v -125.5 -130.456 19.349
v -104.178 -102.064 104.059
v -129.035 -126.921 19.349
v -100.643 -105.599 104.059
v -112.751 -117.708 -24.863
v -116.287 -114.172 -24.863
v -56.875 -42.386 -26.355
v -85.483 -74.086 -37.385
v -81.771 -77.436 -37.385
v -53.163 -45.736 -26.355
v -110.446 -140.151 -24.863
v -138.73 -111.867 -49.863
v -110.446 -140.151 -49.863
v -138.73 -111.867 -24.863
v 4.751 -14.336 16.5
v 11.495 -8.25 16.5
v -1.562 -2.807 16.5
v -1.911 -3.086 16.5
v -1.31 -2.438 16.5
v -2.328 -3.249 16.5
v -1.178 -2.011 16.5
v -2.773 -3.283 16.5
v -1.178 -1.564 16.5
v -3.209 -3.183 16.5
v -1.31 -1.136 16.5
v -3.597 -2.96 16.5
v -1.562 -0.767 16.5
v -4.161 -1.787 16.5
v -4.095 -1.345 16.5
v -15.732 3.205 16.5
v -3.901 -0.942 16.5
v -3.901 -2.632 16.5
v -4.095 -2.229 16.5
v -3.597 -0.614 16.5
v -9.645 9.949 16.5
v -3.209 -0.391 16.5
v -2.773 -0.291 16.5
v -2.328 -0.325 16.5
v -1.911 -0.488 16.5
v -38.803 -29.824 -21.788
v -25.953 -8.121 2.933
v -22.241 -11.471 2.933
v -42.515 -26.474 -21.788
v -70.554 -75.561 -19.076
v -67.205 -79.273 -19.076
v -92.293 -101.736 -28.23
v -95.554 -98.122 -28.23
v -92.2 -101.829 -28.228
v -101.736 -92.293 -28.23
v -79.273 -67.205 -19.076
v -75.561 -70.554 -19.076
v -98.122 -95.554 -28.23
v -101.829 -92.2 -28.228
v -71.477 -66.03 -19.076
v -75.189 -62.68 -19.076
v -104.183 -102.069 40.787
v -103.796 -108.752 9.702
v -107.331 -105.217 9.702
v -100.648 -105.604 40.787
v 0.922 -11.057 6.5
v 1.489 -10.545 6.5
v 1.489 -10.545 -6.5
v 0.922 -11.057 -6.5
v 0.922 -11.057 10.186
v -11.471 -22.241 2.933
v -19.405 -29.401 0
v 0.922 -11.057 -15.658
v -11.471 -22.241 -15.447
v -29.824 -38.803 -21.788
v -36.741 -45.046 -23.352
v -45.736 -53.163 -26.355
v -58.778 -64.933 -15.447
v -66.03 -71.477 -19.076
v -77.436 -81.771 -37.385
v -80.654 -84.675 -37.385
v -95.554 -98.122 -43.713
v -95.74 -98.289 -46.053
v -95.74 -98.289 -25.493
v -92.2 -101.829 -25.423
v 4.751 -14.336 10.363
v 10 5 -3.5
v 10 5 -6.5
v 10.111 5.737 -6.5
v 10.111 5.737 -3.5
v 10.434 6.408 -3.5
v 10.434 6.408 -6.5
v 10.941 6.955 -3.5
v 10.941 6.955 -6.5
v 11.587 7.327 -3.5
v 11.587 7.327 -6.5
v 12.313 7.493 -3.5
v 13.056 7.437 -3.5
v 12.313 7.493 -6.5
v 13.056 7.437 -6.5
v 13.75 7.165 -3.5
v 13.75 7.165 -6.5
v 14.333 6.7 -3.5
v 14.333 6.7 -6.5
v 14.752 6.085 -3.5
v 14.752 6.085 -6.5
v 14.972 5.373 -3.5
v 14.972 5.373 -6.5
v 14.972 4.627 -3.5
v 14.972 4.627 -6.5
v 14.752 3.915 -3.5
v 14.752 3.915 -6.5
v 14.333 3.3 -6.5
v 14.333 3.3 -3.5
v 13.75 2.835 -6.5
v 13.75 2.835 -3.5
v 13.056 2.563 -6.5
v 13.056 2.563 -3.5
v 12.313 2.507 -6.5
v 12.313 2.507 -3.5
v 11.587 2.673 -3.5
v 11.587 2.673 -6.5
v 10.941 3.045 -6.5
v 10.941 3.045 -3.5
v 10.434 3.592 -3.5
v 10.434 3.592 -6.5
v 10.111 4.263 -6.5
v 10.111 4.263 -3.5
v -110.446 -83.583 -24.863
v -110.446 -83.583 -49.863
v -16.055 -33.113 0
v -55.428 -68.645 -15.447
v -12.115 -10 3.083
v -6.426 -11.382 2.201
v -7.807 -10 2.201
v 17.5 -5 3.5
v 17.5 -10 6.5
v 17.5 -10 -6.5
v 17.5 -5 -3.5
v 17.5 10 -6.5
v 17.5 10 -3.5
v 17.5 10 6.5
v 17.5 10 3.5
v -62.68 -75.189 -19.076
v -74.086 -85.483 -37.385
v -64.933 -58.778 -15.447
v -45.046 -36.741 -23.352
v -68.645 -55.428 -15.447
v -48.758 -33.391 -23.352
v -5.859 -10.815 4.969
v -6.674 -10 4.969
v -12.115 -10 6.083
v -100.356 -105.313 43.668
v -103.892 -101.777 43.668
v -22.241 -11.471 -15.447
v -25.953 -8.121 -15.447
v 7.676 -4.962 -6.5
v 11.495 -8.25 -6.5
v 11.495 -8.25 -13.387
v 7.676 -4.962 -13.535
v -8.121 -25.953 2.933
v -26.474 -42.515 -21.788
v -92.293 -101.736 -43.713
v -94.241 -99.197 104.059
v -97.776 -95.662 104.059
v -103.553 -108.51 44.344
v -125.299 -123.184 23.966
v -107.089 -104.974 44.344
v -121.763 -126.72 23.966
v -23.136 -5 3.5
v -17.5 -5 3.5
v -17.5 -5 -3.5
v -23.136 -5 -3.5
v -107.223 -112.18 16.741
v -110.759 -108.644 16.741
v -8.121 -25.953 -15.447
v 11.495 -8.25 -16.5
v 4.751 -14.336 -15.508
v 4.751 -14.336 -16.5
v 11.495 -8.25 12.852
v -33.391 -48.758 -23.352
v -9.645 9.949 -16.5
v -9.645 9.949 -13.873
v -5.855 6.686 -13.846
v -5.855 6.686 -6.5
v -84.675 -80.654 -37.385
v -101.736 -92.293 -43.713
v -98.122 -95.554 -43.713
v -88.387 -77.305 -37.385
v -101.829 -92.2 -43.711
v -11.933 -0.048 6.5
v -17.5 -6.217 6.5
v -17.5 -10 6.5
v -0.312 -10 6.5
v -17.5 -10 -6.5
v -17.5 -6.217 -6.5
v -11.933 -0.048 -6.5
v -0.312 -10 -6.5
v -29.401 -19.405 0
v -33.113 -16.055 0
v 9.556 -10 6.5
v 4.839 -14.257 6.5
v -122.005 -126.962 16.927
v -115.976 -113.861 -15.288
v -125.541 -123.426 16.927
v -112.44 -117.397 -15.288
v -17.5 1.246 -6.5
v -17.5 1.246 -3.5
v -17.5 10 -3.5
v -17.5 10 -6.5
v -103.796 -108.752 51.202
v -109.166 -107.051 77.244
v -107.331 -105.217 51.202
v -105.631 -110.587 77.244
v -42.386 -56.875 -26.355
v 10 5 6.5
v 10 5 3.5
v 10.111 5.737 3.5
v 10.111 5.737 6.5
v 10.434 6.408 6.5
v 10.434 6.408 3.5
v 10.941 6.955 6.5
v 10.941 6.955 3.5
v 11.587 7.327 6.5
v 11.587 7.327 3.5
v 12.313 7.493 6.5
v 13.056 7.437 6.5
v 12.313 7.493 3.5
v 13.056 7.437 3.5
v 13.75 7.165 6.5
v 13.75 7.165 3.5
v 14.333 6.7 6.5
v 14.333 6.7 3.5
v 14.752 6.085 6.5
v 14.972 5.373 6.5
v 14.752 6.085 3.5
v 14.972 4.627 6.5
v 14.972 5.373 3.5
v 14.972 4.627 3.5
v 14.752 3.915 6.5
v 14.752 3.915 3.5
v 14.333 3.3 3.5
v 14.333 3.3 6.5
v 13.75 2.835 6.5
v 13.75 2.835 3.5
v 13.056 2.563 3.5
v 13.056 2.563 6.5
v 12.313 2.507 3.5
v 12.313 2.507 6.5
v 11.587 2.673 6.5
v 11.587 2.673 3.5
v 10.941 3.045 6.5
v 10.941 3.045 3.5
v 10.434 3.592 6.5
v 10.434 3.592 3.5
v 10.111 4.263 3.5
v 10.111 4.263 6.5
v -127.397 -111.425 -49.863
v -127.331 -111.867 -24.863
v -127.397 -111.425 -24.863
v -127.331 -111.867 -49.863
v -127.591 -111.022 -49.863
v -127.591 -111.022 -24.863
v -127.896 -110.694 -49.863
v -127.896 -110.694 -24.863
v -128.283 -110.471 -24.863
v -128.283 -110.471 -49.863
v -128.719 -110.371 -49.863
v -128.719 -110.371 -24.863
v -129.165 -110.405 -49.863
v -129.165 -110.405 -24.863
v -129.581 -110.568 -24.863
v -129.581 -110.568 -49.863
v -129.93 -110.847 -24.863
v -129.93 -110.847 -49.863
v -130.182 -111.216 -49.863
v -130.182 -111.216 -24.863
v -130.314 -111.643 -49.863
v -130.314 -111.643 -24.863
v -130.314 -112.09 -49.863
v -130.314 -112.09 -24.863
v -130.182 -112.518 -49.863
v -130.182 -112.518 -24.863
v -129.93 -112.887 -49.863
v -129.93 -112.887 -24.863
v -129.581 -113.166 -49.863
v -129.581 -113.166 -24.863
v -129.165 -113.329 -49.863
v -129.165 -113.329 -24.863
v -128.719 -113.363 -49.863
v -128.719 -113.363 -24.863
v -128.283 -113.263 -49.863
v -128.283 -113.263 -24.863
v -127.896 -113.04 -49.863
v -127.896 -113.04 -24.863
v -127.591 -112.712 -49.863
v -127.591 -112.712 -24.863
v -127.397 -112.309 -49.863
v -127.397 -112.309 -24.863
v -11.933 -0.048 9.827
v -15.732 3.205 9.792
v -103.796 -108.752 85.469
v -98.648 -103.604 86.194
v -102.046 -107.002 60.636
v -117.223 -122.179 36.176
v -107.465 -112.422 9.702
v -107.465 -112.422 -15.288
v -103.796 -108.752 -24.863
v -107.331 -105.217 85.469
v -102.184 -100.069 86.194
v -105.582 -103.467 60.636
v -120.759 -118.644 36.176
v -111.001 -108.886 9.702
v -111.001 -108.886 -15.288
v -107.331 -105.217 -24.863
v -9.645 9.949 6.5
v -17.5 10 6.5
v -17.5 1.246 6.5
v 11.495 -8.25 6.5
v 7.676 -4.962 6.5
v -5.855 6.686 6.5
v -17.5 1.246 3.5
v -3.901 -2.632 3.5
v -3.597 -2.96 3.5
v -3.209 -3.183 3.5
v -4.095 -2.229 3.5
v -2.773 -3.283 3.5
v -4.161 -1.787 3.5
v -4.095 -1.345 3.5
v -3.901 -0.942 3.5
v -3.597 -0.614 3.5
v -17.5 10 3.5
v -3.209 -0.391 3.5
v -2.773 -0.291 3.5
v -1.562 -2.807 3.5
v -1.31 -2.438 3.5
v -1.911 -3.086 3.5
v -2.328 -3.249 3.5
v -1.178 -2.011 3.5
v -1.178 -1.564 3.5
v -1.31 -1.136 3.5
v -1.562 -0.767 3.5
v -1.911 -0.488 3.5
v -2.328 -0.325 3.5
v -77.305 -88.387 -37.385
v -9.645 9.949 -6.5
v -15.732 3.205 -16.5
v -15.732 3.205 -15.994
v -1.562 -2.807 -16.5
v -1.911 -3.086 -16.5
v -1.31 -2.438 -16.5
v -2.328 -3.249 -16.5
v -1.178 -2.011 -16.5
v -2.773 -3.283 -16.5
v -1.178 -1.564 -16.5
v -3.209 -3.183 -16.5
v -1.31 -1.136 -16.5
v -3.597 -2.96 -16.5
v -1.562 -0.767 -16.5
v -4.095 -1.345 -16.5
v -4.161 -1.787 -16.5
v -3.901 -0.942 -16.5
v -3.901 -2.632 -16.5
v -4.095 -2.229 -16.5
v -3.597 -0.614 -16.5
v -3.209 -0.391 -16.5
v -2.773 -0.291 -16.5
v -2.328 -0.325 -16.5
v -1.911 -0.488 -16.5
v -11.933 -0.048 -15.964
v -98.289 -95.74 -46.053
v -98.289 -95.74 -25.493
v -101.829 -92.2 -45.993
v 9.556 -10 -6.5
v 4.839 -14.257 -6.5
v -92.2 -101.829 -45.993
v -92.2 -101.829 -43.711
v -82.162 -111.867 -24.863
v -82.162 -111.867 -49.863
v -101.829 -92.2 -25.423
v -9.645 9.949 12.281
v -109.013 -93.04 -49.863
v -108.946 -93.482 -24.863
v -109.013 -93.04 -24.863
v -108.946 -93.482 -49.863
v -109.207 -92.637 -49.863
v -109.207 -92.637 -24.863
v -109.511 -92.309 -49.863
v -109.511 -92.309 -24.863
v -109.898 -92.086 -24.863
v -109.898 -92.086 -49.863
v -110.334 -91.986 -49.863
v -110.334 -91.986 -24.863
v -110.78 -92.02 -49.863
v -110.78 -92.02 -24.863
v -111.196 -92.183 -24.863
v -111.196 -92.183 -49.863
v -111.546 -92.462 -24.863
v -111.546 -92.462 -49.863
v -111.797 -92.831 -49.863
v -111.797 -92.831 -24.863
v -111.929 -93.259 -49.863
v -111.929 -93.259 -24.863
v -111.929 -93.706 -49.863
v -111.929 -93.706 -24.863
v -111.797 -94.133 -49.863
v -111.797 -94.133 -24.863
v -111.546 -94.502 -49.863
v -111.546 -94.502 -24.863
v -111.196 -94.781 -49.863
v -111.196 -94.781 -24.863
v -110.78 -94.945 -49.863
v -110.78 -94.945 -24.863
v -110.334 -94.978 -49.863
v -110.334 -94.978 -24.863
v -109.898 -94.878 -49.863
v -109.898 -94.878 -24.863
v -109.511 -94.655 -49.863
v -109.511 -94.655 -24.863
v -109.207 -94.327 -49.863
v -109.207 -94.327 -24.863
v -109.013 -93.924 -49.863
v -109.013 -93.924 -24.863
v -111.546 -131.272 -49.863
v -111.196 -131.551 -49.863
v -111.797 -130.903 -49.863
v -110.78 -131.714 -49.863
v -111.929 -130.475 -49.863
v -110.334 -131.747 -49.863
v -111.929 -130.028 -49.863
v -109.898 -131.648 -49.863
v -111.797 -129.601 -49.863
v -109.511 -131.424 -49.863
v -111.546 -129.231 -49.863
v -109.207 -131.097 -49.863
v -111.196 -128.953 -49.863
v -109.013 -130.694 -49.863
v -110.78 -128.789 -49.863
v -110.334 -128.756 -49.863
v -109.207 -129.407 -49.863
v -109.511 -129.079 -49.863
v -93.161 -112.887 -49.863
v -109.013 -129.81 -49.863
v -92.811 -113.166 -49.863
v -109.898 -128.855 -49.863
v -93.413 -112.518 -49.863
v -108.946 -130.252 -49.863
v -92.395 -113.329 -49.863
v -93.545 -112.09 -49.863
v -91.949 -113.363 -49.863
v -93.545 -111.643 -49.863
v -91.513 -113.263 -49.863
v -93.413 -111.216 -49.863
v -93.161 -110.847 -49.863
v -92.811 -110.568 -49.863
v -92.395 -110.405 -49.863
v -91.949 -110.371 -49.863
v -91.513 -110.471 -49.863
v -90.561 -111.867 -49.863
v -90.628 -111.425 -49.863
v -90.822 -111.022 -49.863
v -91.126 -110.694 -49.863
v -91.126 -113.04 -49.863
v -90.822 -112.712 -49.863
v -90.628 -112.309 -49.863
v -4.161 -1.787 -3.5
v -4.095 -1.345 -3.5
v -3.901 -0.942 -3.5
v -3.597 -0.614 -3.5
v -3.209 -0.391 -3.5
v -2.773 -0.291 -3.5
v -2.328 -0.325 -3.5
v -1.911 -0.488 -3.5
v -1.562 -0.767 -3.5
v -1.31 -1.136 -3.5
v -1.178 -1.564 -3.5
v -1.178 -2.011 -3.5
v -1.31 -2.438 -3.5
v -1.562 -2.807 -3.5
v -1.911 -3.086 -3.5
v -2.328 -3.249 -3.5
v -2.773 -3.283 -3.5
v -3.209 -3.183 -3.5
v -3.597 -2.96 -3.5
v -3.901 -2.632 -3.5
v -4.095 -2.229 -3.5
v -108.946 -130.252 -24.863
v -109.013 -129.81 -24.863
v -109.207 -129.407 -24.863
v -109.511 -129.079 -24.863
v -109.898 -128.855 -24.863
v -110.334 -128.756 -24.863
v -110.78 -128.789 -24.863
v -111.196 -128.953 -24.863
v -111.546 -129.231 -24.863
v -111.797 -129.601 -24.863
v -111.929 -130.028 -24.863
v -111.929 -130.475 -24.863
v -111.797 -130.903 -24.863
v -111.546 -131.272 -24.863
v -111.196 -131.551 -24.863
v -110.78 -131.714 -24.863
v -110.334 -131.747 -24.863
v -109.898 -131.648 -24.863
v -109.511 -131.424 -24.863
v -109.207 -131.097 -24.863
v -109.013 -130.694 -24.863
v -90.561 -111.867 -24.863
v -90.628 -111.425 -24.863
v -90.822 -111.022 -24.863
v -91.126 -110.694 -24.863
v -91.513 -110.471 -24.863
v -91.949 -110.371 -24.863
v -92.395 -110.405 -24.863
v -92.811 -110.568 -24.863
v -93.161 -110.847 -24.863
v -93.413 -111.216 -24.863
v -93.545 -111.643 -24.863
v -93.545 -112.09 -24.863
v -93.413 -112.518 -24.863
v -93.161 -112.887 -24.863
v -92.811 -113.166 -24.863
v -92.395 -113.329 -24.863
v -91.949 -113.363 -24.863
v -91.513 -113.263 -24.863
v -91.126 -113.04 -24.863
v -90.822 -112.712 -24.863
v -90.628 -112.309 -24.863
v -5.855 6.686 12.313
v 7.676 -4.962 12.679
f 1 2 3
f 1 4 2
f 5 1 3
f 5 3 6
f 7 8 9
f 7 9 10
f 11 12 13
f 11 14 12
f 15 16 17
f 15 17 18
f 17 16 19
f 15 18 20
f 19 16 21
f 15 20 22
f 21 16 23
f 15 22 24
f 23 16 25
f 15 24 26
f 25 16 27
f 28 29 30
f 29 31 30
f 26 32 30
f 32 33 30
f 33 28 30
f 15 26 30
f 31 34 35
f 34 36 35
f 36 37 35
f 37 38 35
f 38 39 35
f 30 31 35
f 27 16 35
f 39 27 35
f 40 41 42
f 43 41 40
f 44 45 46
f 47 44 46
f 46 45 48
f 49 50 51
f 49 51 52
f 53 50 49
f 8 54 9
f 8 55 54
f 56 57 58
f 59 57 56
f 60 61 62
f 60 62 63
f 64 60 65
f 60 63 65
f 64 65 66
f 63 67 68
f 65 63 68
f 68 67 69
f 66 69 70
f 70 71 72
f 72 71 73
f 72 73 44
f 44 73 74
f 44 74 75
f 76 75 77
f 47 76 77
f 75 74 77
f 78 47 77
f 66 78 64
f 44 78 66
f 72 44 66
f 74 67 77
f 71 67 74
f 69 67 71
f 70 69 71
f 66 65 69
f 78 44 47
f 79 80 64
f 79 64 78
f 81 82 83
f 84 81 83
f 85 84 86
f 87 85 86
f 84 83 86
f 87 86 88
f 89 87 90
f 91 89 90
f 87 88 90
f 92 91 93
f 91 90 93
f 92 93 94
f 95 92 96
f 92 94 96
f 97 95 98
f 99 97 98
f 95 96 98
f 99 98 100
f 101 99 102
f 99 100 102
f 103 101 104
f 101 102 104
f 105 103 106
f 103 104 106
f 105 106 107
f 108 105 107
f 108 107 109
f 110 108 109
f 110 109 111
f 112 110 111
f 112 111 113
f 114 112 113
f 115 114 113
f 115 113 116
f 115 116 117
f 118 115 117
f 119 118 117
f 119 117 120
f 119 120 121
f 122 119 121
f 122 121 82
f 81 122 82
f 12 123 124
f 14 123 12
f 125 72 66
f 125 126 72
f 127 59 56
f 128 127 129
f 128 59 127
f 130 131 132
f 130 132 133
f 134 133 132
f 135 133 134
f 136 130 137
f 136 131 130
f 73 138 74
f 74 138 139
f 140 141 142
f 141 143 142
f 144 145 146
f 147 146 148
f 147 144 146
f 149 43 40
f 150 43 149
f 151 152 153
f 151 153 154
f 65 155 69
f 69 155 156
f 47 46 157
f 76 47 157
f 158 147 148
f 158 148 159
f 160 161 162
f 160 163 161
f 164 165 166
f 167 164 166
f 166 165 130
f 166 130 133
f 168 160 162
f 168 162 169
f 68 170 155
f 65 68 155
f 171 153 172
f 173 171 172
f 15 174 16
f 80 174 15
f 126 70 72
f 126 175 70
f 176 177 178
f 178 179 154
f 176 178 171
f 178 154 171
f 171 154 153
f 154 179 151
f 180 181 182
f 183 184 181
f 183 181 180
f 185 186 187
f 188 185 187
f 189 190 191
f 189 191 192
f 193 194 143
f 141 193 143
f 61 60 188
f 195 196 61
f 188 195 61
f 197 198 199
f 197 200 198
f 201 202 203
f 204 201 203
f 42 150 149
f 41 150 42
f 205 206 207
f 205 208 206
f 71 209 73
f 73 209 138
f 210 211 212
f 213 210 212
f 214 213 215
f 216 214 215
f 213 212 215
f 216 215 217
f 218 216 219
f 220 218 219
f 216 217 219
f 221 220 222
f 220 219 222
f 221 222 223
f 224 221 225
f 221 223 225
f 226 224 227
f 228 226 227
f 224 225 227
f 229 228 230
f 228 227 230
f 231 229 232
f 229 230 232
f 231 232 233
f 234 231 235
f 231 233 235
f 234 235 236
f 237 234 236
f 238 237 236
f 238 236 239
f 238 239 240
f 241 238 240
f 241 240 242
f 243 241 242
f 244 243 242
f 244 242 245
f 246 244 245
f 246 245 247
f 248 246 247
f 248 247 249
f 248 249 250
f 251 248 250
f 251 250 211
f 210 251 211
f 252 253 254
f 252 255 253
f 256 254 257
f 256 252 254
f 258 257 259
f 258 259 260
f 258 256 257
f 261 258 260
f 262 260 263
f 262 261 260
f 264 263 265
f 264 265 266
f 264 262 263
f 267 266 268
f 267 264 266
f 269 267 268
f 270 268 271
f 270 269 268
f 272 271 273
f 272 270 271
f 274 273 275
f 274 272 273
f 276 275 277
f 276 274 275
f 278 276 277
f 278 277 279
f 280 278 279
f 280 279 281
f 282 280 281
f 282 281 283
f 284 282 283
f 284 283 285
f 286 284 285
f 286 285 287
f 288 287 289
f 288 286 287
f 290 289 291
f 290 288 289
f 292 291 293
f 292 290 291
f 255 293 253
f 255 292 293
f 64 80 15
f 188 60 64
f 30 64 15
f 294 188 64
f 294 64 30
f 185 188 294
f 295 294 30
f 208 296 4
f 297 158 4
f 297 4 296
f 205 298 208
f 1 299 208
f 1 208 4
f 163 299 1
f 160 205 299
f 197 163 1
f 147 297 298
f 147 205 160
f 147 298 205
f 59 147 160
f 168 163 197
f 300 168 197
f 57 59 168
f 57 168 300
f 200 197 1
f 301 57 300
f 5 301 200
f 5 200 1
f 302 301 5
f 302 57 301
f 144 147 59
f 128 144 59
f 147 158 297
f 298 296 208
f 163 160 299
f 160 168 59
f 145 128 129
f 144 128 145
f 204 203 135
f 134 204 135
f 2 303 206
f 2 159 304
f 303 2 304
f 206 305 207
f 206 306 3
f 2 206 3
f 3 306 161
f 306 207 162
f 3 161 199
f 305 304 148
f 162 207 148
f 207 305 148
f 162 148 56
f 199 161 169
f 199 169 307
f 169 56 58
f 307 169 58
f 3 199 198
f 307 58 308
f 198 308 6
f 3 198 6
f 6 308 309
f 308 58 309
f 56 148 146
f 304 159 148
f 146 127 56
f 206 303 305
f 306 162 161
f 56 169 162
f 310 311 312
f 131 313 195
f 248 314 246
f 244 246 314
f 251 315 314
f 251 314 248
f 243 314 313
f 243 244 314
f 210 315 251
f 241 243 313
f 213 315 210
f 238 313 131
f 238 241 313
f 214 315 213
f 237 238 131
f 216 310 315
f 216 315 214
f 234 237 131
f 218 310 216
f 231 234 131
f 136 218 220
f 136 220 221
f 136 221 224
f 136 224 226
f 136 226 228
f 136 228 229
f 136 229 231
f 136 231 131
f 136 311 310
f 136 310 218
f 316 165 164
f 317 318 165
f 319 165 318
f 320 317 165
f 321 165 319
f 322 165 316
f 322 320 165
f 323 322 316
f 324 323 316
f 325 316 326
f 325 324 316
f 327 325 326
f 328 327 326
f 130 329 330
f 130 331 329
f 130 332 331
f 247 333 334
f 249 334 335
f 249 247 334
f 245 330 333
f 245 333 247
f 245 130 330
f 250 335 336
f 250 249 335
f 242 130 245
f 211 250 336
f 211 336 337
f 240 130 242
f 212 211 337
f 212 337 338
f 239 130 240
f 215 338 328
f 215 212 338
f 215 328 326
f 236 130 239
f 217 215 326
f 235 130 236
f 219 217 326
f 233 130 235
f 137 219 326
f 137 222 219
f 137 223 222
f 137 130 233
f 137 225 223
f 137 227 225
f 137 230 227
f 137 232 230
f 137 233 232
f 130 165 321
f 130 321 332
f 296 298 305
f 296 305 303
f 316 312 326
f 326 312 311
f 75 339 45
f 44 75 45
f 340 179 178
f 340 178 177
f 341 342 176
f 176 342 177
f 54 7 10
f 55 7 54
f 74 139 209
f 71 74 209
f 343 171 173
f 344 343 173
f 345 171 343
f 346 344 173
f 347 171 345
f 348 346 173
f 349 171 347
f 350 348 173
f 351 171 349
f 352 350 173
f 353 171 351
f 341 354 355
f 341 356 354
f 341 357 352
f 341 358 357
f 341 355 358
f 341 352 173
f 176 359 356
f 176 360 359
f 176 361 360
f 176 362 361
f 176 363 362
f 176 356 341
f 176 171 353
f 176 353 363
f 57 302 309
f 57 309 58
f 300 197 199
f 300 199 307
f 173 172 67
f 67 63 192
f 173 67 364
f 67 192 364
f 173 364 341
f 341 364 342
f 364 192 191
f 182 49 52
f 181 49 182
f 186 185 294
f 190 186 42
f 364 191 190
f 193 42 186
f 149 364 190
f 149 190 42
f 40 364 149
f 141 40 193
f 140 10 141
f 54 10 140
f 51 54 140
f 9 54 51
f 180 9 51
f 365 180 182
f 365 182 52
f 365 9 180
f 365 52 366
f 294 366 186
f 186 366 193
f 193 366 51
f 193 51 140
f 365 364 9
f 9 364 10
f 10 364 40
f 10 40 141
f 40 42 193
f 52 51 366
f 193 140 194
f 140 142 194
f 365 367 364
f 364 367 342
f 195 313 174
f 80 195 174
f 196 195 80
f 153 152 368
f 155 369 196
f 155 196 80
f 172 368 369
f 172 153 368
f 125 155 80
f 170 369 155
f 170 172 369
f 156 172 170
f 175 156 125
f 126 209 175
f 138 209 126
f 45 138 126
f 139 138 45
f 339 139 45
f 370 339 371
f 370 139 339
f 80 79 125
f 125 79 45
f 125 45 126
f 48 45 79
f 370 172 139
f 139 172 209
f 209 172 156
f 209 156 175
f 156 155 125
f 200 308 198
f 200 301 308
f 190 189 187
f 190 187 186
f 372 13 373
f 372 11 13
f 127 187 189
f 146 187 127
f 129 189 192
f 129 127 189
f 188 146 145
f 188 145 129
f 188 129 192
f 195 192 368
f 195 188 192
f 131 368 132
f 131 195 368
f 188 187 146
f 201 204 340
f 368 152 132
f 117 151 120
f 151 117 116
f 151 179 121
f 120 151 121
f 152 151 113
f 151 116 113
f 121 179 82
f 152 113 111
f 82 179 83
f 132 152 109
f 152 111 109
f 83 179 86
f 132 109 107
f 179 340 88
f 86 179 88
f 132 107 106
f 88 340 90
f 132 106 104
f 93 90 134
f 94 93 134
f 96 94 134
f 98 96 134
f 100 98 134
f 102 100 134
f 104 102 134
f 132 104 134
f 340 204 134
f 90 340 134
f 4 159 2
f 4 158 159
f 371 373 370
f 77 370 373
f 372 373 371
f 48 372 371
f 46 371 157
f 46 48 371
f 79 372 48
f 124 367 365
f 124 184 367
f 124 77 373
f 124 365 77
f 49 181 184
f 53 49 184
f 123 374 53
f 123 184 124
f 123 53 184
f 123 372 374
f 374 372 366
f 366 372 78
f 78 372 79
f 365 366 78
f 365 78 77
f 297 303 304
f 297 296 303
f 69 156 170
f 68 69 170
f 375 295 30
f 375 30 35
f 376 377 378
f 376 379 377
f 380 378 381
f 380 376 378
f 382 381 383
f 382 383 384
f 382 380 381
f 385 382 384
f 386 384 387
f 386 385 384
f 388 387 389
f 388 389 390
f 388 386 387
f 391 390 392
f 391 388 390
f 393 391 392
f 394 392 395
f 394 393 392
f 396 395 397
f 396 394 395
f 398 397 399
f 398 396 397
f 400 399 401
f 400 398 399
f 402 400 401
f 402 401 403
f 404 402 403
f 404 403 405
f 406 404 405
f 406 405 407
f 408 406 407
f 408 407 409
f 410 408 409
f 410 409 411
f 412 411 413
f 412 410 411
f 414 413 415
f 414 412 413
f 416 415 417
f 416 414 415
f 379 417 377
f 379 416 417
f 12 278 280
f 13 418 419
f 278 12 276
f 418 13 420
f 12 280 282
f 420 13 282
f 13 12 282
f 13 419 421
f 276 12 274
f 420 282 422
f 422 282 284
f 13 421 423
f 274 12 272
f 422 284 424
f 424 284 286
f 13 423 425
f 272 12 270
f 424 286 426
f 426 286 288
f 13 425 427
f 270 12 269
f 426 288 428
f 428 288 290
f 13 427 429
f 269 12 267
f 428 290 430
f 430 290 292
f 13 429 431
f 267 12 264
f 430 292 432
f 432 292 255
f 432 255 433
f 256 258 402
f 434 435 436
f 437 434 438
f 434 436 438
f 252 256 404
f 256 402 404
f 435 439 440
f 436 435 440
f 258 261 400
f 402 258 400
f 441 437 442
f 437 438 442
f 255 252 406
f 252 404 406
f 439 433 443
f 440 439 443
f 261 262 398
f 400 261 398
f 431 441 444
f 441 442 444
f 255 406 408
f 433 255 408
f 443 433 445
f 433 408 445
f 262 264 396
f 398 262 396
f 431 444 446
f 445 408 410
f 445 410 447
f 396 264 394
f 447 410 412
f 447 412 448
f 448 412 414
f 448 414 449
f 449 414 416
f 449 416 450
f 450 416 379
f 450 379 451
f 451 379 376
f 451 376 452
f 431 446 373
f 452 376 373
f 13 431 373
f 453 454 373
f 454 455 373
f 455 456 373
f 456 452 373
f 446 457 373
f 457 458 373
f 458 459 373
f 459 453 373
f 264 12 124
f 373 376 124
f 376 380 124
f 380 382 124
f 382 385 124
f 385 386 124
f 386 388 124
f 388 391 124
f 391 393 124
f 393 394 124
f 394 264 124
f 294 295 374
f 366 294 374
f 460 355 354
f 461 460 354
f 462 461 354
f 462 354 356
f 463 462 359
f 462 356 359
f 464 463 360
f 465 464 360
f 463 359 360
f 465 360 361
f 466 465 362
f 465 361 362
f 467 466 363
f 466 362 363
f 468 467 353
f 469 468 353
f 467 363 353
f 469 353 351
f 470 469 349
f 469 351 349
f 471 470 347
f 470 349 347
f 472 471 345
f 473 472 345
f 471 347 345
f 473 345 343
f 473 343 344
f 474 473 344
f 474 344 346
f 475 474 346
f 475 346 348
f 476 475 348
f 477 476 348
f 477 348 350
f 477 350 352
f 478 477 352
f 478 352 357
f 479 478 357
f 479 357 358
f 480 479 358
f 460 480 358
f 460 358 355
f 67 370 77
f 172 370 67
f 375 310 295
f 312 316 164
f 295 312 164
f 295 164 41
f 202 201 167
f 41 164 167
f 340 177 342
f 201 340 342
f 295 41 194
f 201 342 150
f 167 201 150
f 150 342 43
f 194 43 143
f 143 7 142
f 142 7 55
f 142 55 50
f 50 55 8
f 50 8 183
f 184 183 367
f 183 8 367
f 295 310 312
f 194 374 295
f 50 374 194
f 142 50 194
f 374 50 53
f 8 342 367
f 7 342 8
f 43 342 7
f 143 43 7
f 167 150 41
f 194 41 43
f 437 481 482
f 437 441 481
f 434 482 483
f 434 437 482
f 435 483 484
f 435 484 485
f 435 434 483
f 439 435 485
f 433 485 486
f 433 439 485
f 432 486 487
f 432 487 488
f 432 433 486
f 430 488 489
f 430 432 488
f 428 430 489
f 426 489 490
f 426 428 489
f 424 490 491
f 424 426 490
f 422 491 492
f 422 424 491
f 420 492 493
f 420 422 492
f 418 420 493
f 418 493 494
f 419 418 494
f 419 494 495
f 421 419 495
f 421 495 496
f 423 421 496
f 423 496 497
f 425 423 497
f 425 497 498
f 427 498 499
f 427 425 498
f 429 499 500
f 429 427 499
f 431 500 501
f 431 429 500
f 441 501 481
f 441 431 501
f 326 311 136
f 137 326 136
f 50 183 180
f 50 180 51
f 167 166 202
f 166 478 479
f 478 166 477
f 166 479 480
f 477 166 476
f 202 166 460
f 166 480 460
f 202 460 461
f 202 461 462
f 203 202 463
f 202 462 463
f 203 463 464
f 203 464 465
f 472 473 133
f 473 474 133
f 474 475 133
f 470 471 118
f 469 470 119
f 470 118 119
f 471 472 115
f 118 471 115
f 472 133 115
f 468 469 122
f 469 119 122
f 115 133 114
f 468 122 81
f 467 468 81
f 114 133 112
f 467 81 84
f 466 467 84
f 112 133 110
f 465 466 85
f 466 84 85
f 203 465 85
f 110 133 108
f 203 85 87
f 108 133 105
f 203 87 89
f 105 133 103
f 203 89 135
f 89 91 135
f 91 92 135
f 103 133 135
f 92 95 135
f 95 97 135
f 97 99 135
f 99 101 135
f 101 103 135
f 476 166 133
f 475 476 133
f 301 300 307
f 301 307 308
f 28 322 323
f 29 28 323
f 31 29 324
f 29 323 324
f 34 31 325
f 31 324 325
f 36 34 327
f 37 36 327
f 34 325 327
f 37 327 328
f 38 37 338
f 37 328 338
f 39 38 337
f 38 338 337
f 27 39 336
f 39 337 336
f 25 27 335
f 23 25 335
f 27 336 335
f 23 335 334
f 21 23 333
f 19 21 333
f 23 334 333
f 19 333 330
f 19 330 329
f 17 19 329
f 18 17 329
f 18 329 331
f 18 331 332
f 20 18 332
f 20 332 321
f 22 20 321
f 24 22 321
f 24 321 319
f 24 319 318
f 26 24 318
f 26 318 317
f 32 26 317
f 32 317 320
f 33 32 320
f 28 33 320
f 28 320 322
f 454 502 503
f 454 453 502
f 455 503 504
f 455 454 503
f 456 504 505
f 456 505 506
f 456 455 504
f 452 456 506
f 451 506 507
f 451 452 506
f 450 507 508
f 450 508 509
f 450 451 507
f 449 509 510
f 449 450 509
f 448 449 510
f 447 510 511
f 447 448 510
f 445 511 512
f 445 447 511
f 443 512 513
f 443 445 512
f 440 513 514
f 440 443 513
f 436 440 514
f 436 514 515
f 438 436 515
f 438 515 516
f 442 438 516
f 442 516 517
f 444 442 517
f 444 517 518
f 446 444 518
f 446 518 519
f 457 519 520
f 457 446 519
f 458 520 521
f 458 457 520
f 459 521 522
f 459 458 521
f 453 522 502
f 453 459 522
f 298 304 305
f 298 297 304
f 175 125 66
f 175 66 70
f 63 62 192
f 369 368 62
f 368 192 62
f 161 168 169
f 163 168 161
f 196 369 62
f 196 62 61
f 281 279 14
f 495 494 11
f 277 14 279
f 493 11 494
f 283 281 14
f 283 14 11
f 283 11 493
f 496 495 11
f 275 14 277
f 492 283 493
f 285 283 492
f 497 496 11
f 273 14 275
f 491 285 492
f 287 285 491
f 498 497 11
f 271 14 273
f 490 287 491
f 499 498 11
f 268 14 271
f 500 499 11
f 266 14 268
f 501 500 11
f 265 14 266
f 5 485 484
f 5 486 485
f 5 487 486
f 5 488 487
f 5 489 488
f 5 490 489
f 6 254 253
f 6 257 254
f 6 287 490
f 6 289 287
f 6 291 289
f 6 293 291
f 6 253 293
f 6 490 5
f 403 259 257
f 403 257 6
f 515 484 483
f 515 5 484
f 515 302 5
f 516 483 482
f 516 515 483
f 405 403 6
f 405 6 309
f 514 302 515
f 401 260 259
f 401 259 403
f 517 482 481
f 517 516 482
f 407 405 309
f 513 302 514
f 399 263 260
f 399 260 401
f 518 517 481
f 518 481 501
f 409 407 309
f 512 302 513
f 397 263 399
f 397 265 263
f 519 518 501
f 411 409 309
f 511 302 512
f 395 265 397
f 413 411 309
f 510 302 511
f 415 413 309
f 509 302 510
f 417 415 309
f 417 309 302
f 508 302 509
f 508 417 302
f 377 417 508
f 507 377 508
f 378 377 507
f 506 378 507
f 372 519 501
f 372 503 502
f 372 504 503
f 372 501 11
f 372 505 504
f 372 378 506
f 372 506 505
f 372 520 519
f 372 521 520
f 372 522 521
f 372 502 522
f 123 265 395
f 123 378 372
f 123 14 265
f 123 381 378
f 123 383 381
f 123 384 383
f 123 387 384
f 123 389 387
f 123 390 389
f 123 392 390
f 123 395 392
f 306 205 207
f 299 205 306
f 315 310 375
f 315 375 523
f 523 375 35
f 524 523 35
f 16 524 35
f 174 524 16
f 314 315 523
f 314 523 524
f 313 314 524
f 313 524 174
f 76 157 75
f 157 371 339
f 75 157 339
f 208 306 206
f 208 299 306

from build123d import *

# Parameters (mm, degrees)
SKETCH10_W               = 35
SKETCH10_H               = 20
BOSS_EXTRUDE9_DEPTH      = 6.5
SKETCH11_W               = 7
SKETCH11_H               = 15
CUT_EXTRUDE4_DEPTH       = 1
CUT_EXTRUDE4_DEPTH_BACK  = 36
BOSS_EXTRUDE10_DEPTH     = 2.5
CUT_EXTRUDE5_DEPTH       = 20
CUT_EXTRUDE6_DEPTH       = 20
BOSS_EXTRUDE11_DEPTH     = 10
SKETCH23_R               = 1.5
CUT_EXTRUDE7_DEPTH       = 34
SKETCH25_R               = 1.5
BOSS_EXTRUDE12_DEPTH     = 12.5
SKETCH27_W               = 7
SKETCH27_H               = 15
CUT_EXTRUDE9_DEPTH       = 20
SKETCH28_W               = 7
SKETCH28_H               = 6.245605743
CUT_EXTRUDE10_DEPTH      = 20
BOSS_EXTRUDE13_DEPTH     = 2.5
BOSS_EXTRUDE14_DEPTH     = 5
SKETCH31_R               = 2.5
CUT_EXTRUDE11_DEPTH      = 44.363432005
CUT_EXTRUDE11_DEPTH_BACK = 111.559122284


with BuildPart() as part:
    # Sketch10 → Boss-Extrude9 (new body, symmetric)
    with BuildSketch(Plane.XY):
        Rectangle(SKETCH10_W, SKETCH10_H)
    extrude(amount=BOSS_EXTRUDE9_DEPTH, both=True)

    # Sketch11 → Cut-Extrude4 (cut, two sides)
    with BuildSketch(Plane.ZY.offset(17.5)) as cut_extrude4_sk:
        with Locations((0, 2.5)):
            Rectangle(SKETCH11_W, SKETCH11_H)
    extrude(amount=CUT_EXTRUDE4_DEPTH, mode=Mode.SUBTRACT)
    extrude(cut_extrude4_sk.sketch, amount=-CUT_EXTRUDE4_DEPTH_BACK, mode=Mode.SUBTRACT)

    # Sketch19 → Boss-Extrude10 (add, symmetric)
    with BuildSketch(Plane(origin=(7.588283472, -8.408592155, 0), x_dir=(-0.742391283, -0.669966553, 0), z_dir=(0.669966553, -0.742391283, 0))):
        Polygon((-6.806611372, 12.5), (-6.806611372, 6.5), (5.959262629, 6.5), (5.959262629, -6.5), (-9.021371158, -6.5), (-9.021371158, -14.5), (143.193388628, 27.210594591), (143.193388628, 47.516269419), align=None)
        Polygon((23.416933748, 15.447357766), (23.416933748, -2.932626146), (48.137832442, 21.788272547), align=None, mode=Mode.SUBTRACT)
        Polygon((34.103204957, 0), (57.455439154, 23.352234198), (87.138773177, 15.447357766), align=None, mode=Mode.SUBTRACT)
        Polygon((69.571415231, 26.355349278), (96.907086696, 19.075671565), (112.271299908, 37.384757918), align=None, mode=Mode.SUBTRACT)
        Polygon((116.606735087, 37.384757918), (103.00206527, 19.075671565), (136.676990559, 28.230214742), (136.676990559, 43.712984767), align=None, mode=Mode.SUBTRACT)
    boss_extrude10 = extrude(amount=BOSS_EXTRUDE10_DEPTH, both=True)

    # Mirror3: Boss-Extrude10 across plane
    add(boss_extrude10.mirror(Plane(origin=(0, 0, 0), x_dir=(0, 0, 1), z_dir=(-0.707106781, 0.707106781, 0))))

    # Sketch20 → Cut-Extrude5 (cut)
    with BuildSketch(Plane(origin=(0, 0, -6.5), x_dir=(-1, 0, 0), z_dir=(0, 0, -1))):
        Polygon((-13.528185403, -10), (16.011199993, 15.429392684), (-17.5, 15.429392684), (-17.5, -10), align=None)
    extrude(amount=CUT_EXTRUDE5_DEPTH, mode=Mode.SUBTRACT)

    # Sketch21 → Cut-Extrude6 (cut)
    with BuildSketch(Plane.XY.offset(6.5)):
        Polygon((-16.011199993, 15.429392684), (13.528185403, -10), (17.5, -10), (17.5, 17.942203717), align=None)
    extrude(amount=CUT_EXTRUDE6_DEPTH, mode=Mode.SUBTRACT)

    # Sketch22 → Boss-Extrude11 (add)
    with BuildSketch(Plane(origin=(0, 0, -6.5), x_dir=(-1, 0, 0), z_dir=(0, 0, -1))):
        Polygon((-4.751258092, -14.336345099), (15.731654079, 3.20511341), (9.645399477, 9.949304357), (-11.495449039, -8.250090497), align=None)
    boss_extrude11 = extrude(amount=BOSS_EXTRUDE11_DEPTH)

    # Mirror5: Boss-Extrude11 across plane
    add(boss_extrude11.mirror(Plane.XY))

    # Sketch23 → Cut-Extrude7 (cut, through all)
    with BuildSketch(Plane(origin=(0, 0, -16.5), x_dir=(-1, 0, 0), z_dir=(0, 0, -1))):
        with Locations((2.661358897, -1.787066196)):
            Circle(SKETCH23_R)
    extrude(amount=-CUT_EXTRUDE7_DEPTH, mode=Mode.SUBTRACT)

    # Sketch25 → Boss-Extrude12 (add, symmetric)
    with BuildSketch(Plane.XY.offset(-37.363432005)):
        Polygon((-110.446046435, -140.151182494), (-82.161775188, -111.866911247), (-110.446046435, -83.582639999), (-138.730317683, -111.866911247), align=None)
        with Locations((-110.446046435, -93.482134936)):
            Circle(SKETCH25_R, mode=Mode.SUBTRACT)
        with Locations((-92.061270124, -111.866911247)):
            Circle(SKETCH25_R, mode=Mode.SUBTRACT)
        with Locations((-110.446046435, -130.251687558)):
            Circle(SKETCH25_R, mode=Mode.SUBTRACT)
        with Locations((-128.830822746, -111.866911247)):
            Circle(SKETCH25_R, mode=Mode.SUBTRACT)
    extrude(amount=BOSS_EXTRUDE12_DEPTH, both=True)

    # Sketch27 → Cut-Extrude9 (cut)
    with BuildSketch(Plane.ZY.offset(17.5)):
        with Locations((0, 2.5)):
            Rectangle(SKETCH27_W, SKETCH27_H)
    extrude(amount=-CUT_EXTRUDE9_DEPTH, mode=Mode.SUBTRACT)

    # Sketch28 → Cut-Extrude10 (cut)
    with BuildSketch(Plane(origin=(-17.5, 0, 0), x_dir=(0, 0, -1), z_dir=(1, 0, 0))):
        with Locations((0, -1.877197128)):
            Rectangle(SKETCH28_W, SKETCH28_H)
    extrude(amount=-CUT_EXTRUDE10_DEPTH, mode=Mode.SUBTRACT)

    # Sketch29 → Boss-Extrude13 (add, symmetric)
    with BuildSketch(Plane(origin=(0.710432406, -0.710432406, 0), x_dir=(0, 0, -1), z_dir=(0.707106781, -0.707106781, 0))):
        Polygon((-19.348604545, -180.98841896), (25.940877716, -162.519522981), (25.940877716, -150.294032198), (-9.701797277, -150.294032198), (-104.059122284, -136.781099823), (-104.059122284, -145.835191948), align=None)
        Polygon((-86.194464325, -143.014000871), (-85.469075751, -150.294032198), (-60.635525341, -147.819595909), align=None, mode=Mode.SUBTRACT)
        Polygon((-77.244001552, -152.888925889), (-36.176017731, -169.28301403), (-51.201535414, -150.294032198), align=None, mode=Mode.SUBTRACT)
        Polygon((15.288083197, -155.48381958), (-9.701797277, -155.48381958), (-16.926790753, -176.046505079), (15.288083197, -162.519522981), align=None, mode=Mode.SUBTRACT)
        Polygon((-23.96640174, -175.703793654), (-44.343704752, -149.951320773), (-16.741408265, -155.141108155), align=None, mode=Mode.SUBTRACT)
        Polygon((25.940877716, -162.519522981), (25.940877716, -150.294032198), (-9.701797277, -150.294032198), (-104.059122284, -136.781099823), (-104.059122284, -145.835191948), (-19.348604545, -180.98841896), align=None)
        Polygon((-51.201535414, -150.294032198), (-36.176017731, -169.28301403), (-77.244001552, -152.888925889), align=None, mode=Mode.SUBTRACT)
        Polygon((-44.343704752, -149.951320773), (-16.741408265, -155.141108155), (-23.96640174, -175.703793654), align=None, mode=Mode.SUBTRACT)
        Polygon((-16.926790753, -176.046505079), (-9.701797277, -155.48381958), (15.288083197, -155.48381958), (15.288083197, -162.519522981), align=None, mode=Mode.SUBTRACT)
        Polygon((-60.635525341, -147.819595909), (-85.469075751, -150.294032198), (-86.194464325, -143.014000871), align=None, mode=Mode.SUBTRACT)
    extrude(amount=BOSS_EXTRUDE13_DEPTH, both=True)

    # Sketch30 → Boss-Extrude14 (add)
    with BuildSketch(Plane(origin=(2.478199359, -2.478199359, 0), x_dir=(0, 0, -1), z_dir=(0.707106781, -0.707106781, 0))):
        Polygon((-41.059122284, -146.781099823), (-2.200668351, -12.59179888), (-4.968563169, -11.790273627), (-44.059122284, -146.781099823), align=None)
    extrude(amount=-BOSS_EXTRUDE14_DEPTH)

    # Sketch31 → Cut-Extrude11 (cut, two sides)
    with BuildSketch(Plane(origin=(0, 0, -6.5), x_dir=(-1, 0, 0), z_dir=(0, 0, -1))) as cut_extrude11_sk:
        with Locations((-12.5, 5)):
            Circle(SKETCH31_R)
    extrude(amount=CUT_EXTRUDE11_DEPTH, mode=Mode.SUBTRACT)
    extrude(cut_extrude11_sk.sketch, amount=-CUT_EXTRUDE11_DEPTH_BACK, mode=Mode.SUBTRACT)


solid = part.part
